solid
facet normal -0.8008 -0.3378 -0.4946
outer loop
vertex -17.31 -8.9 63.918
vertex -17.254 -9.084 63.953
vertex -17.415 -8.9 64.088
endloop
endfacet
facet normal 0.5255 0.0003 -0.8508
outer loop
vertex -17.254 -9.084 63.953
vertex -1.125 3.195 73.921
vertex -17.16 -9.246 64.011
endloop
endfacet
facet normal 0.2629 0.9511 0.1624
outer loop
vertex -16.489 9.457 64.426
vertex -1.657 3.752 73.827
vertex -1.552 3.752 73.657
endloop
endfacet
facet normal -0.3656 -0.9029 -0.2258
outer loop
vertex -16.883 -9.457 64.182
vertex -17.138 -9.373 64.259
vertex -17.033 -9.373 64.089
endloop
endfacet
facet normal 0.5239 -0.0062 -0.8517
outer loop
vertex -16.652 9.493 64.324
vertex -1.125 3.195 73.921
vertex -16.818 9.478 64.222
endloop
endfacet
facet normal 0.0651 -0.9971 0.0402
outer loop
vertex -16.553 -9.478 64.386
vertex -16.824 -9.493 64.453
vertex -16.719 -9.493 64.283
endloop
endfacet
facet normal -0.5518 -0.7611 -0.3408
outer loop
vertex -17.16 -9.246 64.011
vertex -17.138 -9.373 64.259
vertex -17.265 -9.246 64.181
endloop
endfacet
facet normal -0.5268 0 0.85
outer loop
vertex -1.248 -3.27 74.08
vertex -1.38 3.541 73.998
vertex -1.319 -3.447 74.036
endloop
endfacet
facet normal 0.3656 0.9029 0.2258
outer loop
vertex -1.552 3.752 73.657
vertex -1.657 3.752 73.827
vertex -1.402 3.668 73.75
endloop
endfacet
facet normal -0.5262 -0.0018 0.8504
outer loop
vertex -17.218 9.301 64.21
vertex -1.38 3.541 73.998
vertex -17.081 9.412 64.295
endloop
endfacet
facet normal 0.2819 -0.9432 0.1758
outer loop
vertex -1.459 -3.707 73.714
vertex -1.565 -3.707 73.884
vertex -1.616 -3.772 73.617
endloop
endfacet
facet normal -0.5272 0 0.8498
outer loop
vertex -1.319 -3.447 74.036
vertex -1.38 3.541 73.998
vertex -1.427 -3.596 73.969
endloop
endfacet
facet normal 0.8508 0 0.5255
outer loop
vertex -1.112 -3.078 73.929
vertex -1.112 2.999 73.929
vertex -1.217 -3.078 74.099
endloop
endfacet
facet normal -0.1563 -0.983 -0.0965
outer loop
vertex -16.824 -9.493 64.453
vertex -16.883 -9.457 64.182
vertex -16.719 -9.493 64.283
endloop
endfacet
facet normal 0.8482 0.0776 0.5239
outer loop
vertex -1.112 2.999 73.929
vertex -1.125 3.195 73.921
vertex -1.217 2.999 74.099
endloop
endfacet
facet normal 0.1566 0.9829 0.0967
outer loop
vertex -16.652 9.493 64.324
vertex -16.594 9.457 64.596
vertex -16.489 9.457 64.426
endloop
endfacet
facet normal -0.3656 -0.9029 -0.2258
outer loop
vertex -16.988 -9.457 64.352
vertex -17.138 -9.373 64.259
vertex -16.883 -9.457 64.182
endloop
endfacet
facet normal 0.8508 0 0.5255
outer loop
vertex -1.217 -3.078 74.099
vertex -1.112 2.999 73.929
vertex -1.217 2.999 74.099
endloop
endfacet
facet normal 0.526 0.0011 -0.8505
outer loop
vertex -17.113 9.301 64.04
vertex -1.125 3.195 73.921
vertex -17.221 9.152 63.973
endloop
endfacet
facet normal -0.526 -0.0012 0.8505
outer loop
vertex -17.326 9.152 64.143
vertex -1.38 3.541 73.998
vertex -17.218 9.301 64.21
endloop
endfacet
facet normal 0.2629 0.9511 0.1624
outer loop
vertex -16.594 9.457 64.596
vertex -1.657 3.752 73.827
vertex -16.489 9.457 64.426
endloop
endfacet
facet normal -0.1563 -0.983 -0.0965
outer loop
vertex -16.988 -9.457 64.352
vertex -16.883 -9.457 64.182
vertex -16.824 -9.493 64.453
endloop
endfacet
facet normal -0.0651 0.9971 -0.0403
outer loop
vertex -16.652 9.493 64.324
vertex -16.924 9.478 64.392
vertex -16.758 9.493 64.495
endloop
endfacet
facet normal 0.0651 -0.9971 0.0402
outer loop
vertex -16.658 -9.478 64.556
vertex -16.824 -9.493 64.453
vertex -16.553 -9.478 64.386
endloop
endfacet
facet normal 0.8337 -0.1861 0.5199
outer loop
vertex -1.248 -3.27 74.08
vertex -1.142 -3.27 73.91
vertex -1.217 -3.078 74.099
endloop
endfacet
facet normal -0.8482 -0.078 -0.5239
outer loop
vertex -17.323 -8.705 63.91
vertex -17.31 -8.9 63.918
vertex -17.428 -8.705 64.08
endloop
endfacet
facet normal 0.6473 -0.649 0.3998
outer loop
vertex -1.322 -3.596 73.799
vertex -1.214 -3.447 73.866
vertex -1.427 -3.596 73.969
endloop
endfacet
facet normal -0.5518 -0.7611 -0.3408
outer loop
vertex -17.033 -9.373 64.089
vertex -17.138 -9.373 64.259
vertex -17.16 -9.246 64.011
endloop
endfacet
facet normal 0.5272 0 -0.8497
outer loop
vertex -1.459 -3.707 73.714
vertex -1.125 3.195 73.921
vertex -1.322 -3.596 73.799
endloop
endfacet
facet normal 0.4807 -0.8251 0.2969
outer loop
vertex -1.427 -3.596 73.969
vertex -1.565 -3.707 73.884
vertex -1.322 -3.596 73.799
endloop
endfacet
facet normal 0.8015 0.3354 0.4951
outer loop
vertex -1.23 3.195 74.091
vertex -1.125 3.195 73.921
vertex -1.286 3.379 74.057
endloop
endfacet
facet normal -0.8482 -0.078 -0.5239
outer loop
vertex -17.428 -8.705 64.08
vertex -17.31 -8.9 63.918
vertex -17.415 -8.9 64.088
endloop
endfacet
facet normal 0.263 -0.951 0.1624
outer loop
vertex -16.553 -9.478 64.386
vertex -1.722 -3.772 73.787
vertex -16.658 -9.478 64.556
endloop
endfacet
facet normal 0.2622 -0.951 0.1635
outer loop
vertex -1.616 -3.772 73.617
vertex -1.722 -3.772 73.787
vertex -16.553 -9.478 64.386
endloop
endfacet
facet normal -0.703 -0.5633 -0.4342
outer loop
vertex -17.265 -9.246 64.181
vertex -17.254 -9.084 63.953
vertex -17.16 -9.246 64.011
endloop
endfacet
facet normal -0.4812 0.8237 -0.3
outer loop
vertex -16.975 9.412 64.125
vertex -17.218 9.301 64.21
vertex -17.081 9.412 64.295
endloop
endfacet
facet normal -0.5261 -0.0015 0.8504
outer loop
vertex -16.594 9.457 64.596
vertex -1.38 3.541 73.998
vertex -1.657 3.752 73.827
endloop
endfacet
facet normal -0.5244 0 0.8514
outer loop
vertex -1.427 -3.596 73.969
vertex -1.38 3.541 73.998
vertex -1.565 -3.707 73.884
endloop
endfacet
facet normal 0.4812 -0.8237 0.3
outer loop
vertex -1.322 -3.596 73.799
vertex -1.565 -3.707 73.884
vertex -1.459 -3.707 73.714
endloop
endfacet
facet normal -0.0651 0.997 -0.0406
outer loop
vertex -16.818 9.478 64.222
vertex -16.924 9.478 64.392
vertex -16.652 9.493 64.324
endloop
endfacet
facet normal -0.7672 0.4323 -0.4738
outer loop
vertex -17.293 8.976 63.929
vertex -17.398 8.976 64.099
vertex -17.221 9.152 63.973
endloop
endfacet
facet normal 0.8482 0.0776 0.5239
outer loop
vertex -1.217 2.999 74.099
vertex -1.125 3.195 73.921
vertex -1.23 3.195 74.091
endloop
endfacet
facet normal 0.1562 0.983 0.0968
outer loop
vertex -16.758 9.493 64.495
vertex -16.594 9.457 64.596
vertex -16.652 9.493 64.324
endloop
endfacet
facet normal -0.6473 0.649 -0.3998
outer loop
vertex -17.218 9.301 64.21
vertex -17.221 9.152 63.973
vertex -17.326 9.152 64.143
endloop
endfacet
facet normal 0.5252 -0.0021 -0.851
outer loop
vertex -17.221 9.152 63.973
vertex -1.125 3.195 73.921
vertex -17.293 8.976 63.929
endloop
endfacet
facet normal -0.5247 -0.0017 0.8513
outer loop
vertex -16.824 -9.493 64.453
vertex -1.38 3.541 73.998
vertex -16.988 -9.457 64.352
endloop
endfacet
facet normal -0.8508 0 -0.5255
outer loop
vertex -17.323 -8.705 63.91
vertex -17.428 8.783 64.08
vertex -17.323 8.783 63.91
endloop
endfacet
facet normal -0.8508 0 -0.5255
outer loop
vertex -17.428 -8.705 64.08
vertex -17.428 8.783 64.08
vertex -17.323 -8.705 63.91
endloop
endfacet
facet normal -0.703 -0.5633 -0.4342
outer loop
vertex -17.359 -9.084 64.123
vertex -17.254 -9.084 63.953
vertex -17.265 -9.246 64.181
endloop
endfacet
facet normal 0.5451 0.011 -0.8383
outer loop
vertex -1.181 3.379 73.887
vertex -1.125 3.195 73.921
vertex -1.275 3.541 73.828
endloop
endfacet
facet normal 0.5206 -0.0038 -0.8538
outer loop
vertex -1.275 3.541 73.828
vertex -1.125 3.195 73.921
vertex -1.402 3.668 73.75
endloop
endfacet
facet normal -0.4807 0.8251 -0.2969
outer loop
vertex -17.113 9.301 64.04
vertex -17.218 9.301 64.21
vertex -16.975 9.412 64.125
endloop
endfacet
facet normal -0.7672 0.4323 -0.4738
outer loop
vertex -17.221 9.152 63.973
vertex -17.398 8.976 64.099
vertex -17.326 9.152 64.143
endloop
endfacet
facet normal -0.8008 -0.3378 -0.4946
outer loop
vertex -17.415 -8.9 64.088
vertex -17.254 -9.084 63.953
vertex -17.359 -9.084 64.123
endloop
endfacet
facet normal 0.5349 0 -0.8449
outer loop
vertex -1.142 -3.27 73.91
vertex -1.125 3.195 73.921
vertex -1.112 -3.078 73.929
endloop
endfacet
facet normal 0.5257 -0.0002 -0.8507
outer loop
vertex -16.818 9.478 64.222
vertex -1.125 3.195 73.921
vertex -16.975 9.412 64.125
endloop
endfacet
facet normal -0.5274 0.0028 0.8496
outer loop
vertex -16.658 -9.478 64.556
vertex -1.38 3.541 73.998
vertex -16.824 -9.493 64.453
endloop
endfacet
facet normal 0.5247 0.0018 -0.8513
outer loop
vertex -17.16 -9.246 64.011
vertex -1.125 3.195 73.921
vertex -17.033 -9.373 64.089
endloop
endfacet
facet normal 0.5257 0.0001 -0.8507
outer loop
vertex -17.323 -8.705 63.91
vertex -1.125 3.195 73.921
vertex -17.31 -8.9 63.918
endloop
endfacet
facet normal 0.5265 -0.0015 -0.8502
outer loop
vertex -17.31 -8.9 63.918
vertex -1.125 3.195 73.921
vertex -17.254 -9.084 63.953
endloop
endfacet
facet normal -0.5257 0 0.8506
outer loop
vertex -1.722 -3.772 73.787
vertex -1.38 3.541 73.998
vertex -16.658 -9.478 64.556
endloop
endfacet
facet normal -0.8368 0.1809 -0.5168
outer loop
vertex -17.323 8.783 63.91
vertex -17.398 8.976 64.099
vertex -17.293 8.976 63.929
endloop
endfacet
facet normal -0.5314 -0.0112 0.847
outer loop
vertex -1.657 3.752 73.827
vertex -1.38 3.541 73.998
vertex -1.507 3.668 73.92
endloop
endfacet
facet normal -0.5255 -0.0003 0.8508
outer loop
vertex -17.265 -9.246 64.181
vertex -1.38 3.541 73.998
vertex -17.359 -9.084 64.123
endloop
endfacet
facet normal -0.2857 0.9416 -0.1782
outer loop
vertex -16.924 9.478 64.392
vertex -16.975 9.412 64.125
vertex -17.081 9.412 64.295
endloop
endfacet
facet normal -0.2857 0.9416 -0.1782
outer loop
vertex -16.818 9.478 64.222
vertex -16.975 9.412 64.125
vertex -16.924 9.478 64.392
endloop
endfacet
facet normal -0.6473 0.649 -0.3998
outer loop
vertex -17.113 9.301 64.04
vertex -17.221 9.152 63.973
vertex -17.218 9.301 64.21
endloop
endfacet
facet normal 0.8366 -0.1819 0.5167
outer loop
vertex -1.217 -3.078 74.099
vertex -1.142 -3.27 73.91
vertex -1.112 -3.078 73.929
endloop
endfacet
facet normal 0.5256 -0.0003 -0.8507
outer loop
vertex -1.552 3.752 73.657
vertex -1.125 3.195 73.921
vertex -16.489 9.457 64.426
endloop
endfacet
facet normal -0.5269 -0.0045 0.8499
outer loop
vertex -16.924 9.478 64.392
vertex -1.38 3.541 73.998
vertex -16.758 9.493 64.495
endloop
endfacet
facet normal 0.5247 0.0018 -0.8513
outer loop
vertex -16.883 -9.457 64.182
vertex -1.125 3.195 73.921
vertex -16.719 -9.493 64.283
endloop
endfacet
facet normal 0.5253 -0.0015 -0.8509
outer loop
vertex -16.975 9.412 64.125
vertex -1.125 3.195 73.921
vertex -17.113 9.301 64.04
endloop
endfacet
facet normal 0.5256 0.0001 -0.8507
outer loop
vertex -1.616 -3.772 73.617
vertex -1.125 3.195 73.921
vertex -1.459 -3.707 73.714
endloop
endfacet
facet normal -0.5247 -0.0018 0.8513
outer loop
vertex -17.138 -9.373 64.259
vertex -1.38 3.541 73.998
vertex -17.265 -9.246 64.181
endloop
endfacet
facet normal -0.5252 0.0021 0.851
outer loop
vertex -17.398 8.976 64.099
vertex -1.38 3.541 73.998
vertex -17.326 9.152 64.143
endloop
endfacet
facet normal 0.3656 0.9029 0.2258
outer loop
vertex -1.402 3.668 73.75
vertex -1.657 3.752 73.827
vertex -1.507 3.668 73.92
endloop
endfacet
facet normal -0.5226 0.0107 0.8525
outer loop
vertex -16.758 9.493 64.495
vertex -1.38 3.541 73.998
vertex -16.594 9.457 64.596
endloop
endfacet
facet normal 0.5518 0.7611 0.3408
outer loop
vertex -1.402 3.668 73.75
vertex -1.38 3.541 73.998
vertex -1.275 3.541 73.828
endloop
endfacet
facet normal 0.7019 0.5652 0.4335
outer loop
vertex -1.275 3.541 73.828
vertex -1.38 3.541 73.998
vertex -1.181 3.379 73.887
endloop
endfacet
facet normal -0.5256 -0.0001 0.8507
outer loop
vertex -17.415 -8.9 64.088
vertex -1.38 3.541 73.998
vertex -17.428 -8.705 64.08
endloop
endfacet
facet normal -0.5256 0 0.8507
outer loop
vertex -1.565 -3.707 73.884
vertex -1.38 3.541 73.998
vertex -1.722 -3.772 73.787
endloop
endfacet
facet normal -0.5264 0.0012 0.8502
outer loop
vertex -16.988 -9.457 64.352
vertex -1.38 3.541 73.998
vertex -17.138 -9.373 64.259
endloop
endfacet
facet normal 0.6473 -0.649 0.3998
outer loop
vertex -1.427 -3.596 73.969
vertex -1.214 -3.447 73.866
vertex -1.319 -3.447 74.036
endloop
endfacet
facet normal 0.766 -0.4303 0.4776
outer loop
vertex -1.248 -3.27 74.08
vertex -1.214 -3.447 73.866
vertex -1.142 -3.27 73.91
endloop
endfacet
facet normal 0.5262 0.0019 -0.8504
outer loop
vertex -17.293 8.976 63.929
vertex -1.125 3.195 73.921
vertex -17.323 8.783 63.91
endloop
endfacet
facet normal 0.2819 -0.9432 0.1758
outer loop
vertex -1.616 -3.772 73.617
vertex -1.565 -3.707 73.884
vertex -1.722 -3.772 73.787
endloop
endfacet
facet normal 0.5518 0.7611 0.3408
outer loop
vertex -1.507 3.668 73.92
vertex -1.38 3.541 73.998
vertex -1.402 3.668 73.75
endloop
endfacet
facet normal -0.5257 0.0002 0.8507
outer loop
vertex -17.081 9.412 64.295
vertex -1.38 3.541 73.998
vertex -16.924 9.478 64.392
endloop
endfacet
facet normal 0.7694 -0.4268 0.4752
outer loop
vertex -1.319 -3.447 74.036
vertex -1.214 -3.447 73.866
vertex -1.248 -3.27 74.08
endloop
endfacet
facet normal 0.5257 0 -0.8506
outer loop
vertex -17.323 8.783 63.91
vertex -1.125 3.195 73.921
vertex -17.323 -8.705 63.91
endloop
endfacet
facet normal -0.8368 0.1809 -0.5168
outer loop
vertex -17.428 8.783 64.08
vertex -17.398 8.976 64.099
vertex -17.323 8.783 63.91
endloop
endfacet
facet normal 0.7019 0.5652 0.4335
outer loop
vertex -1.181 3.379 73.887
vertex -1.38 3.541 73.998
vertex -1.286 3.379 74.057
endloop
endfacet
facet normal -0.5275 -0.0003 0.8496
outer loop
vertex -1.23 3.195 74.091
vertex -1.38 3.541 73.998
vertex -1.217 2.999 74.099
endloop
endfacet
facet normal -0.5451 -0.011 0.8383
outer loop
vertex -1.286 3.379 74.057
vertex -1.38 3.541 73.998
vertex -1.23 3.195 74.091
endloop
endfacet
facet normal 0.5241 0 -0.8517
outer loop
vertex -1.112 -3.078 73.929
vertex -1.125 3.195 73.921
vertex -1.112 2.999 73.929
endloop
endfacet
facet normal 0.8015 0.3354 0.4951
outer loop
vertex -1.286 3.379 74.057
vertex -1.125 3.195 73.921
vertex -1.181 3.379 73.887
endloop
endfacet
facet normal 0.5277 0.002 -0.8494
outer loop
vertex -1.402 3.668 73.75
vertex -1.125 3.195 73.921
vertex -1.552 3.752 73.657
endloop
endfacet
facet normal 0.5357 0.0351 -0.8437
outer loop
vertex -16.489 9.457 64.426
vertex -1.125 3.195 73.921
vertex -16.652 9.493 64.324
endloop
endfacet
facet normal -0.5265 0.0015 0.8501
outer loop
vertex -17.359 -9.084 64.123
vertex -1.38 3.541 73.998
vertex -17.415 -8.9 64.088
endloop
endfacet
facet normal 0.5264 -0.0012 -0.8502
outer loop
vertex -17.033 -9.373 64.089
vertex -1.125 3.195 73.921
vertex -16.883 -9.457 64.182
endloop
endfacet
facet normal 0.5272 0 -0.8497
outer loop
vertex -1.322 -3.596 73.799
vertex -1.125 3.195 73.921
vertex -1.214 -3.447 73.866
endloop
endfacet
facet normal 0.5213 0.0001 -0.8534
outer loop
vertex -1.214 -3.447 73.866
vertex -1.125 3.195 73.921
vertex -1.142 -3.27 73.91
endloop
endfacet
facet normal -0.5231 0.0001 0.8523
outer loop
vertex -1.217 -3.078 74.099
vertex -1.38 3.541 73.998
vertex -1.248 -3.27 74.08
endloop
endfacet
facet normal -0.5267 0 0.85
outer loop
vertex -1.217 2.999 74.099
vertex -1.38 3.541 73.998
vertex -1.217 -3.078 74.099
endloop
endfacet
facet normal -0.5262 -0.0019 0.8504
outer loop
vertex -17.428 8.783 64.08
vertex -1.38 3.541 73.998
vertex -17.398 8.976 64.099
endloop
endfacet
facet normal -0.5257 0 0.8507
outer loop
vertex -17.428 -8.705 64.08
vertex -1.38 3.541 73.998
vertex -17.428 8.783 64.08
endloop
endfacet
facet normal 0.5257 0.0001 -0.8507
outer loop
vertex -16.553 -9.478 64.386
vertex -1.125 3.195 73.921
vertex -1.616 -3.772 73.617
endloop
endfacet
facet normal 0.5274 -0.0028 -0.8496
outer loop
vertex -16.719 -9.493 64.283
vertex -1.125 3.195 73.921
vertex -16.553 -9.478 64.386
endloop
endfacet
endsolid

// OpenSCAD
// file: def.scad
inf = 1000;

round_radius = 1;
sticker_margin = 2.5;
sticker_round_radius = 0.75;

phi = (sqrt(5) + 1) / 2;
outer_radius = 80;
edge_length = outer_radius / sqrt(phi * phi * phi * phi + 1) * 2;
inner_radius = sqrt(outer_radius * outer_radius - (edge_length / 2 / cos(54)) * (edge_length / 2 / cos(54)));
cut1_length = edge_length / (1 / (phi * phi) + 2) * 3;
center_cut_length = edge_length * (sin(54) + 1);
cut1_dis = inner_radius * (center_cut_length - cut1_length) / (center_cut_length - edge_length);

theta = atan(edge_length / 2 * tan(54) / inner_radius);

face_inner_radius = edge_length / 2 * tan(54);
face_center_length = edge_length * tan(54) / cos(18);
sticker_cut1_dis = face_inner_radius * (face_center_length - cut1_length) / (face_center_length - edge_length);
sticker_dif_cut1_dis = sticker_cut1_dis - round_radius * tan(theta) + round_radius - sticker_margin;
sticker_int_cut1_dis = sticker_cut1_dis + round_radius / tan(theta) - round_radius + sticker_margin;
sticker_dif_cut2_dis = face_inner_radius - round_radius * tan(theta) + round_radius - sticker_margin;

module _int_cut1() {
    translate([-inf, -inf, cut1_dis + round_radius])
        cube([inf * 2, inf * 2, inf]);
}

module _dif_cut1() {
    translate([-inf, -inf, cut1_dis - round_radius])
        cube([inf * 2, inf * 2, inf]);
}

module _sticker_int_cut1() {
    rotate([-90, 0, 0])
        translate([-inf, -inf, sticker_int_cut1_dis])
            cube([inf * 2, inf * 2, inf]);
}

module _sticker_dif_cut1() {
    rotate([-90, 0, 0])
        translate([-inf, -inf, sticker_dif_cut1_dis])
            cube([inf * 2, inf * 2, inf]);
}

module _sticker_dif_cut2() {
    rotate([-90, 0, 0])
        translate([-inf, -inf, sticker_dif_cut2_dis])
            cube([inf * 2, inf * 2, inf]);
}

module _base() {
    intersection_for(vec = [[0, 0, 0], [90, 90, 0], [90, 0, 90]])
        intersection_for(ang = [theta, -theta, 180 + theta, 180 - theta])
            rotate(vec)
                rotate([0, ang, 0])
                    translate([-inf, -inf, -inner_radius + round_radius])
                        cube([inf * 2, inf * 2, inf]);
}

module _sticker_base() {
    difference() {
        cube([inf, inf, 0.1], center = true);
        for (ang = [0 : 72 : 288])
            rotate([0, 0, ang])
                _sticker_dif_cut2();
    }
}

module _selector_base(dis) {
    intersection_for(vec = [[0, 0, 0], [90, 90, 0], [90, 0, 90]])
        intersection_for(ang = [theta, -theta, 180 + theta, 180 - theta])
            rotate(vec)
                rotate([0, ang, 0])
                    translate([-inf, -inf, -dis])
                        cube([inf * 2, inf * 2, inf]);
}
// main file
include <def.scad>

module edge_sticker() {
    minkowski() {
        difference() {
            intersection() {
                _sticker_base();
                rotate([0, 0, -72])
                    _sticker_int_cut1();
            }
            for (ang = [0, -144])
                rotate([0, 0, ang])
                    _sticker_dif_cut1();
        }
        cylinder(r = sticker_round_radius, h = 0.1, center = true, $fn = 24);
    }
}

rotate([0, -theta, 0])
    translate([0, 0, inner_radius])
        rotate([0, 0, -18])
            edge_sticker();
